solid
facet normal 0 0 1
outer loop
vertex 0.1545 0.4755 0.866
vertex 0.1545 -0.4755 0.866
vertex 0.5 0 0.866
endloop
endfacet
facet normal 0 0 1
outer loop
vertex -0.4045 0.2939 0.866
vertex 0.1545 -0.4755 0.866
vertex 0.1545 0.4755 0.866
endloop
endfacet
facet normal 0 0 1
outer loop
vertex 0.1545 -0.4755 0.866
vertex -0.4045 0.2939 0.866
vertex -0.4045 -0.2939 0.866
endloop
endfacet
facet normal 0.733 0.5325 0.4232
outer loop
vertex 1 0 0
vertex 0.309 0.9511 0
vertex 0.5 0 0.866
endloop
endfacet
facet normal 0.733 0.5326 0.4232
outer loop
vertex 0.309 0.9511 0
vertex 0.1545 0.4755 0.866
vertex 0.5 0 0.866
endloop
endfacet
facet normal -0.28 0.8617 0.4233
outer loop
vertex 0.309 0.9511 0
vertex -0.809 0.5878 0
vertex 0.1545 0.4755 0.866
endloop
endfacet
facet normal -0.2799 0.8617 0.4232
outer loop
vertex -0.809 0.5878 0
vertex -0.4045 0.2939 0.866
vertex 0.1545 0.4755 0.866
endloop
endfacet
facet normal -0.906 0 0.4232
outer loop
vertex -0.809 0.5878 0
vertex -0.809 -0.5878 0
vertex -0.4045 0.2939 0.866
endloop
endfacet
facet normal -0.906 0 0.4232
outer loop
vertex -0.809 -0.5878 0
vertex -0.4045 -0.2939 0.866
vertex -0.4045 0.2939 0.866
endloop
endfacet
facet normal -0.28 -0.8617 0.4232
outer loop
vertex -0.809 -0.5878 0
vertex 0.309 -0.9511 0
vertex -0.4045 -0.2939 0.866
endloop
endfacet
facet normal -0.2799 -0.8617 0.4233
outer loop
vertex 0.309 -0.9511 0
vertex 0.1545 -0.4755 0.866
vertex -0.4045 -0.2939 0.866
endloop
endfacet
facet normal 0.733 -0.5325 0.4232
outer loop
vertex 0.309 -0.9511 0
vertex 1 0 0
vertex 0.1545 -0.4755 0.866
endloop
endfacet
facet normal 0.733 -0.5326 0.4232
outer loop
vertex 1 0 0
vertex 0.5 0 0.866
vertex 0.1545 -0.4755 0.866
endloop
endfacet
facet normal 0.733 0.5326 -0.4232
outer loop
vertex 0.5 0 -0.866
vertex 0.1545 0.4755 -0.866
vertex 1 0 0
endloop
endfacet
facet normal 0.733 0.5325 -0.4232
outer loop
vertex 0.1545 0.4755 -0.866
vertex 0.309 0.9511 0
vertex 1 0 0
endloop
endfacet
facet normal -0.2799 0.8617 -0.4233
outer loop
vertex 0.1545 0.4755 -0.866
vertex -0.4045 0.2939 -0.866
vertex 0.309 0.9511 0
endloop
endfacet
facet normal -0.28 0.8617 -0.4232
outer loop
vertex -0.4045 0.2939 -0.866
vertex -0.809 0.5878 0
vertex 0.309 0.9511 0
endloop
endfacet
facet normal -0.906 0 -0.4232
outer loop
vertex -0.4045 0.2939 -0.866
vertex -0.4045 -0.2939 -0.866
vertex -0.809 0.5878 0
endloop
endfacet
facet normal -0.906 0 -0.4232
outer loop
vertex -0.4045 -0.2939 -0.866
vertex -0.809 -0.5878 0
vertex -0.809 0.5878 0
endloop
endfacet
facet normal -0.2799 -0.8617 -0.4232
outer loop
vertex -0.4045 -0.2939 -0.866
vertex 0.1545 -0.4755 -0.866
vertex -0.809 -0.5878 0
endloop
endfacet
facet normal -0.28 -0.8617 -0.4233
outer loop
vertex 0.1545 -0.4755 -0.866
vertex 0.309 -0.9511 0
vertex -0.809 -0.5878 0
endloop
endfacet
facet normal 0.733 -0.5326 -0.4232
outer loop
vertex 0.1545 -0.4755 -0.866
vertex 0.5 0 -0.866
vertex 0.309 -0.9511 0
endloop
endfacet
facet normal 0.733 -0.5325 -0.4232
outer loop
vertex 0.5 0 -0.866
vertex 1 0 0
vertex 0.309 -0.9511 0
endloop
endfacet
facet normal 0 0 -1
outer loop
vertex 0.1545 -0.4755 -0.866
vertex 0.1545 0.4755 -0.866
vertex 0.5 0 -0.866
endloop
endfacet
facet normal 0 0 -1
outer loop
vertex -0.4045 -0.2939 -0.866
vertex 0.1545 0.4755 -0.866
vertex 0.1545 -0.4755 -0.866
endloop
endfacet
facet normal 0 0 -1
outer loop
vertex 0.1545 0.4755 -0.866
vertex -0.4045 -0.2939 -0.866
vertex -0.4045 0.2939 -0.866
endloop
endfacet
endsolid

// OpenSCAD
// Volume: 2.4022773708962215, SurfaceArea: 9.616227657898785
// yields: sphere($fn = 0, $fa = 12, $fs = 2, r = 1);
sphere();
